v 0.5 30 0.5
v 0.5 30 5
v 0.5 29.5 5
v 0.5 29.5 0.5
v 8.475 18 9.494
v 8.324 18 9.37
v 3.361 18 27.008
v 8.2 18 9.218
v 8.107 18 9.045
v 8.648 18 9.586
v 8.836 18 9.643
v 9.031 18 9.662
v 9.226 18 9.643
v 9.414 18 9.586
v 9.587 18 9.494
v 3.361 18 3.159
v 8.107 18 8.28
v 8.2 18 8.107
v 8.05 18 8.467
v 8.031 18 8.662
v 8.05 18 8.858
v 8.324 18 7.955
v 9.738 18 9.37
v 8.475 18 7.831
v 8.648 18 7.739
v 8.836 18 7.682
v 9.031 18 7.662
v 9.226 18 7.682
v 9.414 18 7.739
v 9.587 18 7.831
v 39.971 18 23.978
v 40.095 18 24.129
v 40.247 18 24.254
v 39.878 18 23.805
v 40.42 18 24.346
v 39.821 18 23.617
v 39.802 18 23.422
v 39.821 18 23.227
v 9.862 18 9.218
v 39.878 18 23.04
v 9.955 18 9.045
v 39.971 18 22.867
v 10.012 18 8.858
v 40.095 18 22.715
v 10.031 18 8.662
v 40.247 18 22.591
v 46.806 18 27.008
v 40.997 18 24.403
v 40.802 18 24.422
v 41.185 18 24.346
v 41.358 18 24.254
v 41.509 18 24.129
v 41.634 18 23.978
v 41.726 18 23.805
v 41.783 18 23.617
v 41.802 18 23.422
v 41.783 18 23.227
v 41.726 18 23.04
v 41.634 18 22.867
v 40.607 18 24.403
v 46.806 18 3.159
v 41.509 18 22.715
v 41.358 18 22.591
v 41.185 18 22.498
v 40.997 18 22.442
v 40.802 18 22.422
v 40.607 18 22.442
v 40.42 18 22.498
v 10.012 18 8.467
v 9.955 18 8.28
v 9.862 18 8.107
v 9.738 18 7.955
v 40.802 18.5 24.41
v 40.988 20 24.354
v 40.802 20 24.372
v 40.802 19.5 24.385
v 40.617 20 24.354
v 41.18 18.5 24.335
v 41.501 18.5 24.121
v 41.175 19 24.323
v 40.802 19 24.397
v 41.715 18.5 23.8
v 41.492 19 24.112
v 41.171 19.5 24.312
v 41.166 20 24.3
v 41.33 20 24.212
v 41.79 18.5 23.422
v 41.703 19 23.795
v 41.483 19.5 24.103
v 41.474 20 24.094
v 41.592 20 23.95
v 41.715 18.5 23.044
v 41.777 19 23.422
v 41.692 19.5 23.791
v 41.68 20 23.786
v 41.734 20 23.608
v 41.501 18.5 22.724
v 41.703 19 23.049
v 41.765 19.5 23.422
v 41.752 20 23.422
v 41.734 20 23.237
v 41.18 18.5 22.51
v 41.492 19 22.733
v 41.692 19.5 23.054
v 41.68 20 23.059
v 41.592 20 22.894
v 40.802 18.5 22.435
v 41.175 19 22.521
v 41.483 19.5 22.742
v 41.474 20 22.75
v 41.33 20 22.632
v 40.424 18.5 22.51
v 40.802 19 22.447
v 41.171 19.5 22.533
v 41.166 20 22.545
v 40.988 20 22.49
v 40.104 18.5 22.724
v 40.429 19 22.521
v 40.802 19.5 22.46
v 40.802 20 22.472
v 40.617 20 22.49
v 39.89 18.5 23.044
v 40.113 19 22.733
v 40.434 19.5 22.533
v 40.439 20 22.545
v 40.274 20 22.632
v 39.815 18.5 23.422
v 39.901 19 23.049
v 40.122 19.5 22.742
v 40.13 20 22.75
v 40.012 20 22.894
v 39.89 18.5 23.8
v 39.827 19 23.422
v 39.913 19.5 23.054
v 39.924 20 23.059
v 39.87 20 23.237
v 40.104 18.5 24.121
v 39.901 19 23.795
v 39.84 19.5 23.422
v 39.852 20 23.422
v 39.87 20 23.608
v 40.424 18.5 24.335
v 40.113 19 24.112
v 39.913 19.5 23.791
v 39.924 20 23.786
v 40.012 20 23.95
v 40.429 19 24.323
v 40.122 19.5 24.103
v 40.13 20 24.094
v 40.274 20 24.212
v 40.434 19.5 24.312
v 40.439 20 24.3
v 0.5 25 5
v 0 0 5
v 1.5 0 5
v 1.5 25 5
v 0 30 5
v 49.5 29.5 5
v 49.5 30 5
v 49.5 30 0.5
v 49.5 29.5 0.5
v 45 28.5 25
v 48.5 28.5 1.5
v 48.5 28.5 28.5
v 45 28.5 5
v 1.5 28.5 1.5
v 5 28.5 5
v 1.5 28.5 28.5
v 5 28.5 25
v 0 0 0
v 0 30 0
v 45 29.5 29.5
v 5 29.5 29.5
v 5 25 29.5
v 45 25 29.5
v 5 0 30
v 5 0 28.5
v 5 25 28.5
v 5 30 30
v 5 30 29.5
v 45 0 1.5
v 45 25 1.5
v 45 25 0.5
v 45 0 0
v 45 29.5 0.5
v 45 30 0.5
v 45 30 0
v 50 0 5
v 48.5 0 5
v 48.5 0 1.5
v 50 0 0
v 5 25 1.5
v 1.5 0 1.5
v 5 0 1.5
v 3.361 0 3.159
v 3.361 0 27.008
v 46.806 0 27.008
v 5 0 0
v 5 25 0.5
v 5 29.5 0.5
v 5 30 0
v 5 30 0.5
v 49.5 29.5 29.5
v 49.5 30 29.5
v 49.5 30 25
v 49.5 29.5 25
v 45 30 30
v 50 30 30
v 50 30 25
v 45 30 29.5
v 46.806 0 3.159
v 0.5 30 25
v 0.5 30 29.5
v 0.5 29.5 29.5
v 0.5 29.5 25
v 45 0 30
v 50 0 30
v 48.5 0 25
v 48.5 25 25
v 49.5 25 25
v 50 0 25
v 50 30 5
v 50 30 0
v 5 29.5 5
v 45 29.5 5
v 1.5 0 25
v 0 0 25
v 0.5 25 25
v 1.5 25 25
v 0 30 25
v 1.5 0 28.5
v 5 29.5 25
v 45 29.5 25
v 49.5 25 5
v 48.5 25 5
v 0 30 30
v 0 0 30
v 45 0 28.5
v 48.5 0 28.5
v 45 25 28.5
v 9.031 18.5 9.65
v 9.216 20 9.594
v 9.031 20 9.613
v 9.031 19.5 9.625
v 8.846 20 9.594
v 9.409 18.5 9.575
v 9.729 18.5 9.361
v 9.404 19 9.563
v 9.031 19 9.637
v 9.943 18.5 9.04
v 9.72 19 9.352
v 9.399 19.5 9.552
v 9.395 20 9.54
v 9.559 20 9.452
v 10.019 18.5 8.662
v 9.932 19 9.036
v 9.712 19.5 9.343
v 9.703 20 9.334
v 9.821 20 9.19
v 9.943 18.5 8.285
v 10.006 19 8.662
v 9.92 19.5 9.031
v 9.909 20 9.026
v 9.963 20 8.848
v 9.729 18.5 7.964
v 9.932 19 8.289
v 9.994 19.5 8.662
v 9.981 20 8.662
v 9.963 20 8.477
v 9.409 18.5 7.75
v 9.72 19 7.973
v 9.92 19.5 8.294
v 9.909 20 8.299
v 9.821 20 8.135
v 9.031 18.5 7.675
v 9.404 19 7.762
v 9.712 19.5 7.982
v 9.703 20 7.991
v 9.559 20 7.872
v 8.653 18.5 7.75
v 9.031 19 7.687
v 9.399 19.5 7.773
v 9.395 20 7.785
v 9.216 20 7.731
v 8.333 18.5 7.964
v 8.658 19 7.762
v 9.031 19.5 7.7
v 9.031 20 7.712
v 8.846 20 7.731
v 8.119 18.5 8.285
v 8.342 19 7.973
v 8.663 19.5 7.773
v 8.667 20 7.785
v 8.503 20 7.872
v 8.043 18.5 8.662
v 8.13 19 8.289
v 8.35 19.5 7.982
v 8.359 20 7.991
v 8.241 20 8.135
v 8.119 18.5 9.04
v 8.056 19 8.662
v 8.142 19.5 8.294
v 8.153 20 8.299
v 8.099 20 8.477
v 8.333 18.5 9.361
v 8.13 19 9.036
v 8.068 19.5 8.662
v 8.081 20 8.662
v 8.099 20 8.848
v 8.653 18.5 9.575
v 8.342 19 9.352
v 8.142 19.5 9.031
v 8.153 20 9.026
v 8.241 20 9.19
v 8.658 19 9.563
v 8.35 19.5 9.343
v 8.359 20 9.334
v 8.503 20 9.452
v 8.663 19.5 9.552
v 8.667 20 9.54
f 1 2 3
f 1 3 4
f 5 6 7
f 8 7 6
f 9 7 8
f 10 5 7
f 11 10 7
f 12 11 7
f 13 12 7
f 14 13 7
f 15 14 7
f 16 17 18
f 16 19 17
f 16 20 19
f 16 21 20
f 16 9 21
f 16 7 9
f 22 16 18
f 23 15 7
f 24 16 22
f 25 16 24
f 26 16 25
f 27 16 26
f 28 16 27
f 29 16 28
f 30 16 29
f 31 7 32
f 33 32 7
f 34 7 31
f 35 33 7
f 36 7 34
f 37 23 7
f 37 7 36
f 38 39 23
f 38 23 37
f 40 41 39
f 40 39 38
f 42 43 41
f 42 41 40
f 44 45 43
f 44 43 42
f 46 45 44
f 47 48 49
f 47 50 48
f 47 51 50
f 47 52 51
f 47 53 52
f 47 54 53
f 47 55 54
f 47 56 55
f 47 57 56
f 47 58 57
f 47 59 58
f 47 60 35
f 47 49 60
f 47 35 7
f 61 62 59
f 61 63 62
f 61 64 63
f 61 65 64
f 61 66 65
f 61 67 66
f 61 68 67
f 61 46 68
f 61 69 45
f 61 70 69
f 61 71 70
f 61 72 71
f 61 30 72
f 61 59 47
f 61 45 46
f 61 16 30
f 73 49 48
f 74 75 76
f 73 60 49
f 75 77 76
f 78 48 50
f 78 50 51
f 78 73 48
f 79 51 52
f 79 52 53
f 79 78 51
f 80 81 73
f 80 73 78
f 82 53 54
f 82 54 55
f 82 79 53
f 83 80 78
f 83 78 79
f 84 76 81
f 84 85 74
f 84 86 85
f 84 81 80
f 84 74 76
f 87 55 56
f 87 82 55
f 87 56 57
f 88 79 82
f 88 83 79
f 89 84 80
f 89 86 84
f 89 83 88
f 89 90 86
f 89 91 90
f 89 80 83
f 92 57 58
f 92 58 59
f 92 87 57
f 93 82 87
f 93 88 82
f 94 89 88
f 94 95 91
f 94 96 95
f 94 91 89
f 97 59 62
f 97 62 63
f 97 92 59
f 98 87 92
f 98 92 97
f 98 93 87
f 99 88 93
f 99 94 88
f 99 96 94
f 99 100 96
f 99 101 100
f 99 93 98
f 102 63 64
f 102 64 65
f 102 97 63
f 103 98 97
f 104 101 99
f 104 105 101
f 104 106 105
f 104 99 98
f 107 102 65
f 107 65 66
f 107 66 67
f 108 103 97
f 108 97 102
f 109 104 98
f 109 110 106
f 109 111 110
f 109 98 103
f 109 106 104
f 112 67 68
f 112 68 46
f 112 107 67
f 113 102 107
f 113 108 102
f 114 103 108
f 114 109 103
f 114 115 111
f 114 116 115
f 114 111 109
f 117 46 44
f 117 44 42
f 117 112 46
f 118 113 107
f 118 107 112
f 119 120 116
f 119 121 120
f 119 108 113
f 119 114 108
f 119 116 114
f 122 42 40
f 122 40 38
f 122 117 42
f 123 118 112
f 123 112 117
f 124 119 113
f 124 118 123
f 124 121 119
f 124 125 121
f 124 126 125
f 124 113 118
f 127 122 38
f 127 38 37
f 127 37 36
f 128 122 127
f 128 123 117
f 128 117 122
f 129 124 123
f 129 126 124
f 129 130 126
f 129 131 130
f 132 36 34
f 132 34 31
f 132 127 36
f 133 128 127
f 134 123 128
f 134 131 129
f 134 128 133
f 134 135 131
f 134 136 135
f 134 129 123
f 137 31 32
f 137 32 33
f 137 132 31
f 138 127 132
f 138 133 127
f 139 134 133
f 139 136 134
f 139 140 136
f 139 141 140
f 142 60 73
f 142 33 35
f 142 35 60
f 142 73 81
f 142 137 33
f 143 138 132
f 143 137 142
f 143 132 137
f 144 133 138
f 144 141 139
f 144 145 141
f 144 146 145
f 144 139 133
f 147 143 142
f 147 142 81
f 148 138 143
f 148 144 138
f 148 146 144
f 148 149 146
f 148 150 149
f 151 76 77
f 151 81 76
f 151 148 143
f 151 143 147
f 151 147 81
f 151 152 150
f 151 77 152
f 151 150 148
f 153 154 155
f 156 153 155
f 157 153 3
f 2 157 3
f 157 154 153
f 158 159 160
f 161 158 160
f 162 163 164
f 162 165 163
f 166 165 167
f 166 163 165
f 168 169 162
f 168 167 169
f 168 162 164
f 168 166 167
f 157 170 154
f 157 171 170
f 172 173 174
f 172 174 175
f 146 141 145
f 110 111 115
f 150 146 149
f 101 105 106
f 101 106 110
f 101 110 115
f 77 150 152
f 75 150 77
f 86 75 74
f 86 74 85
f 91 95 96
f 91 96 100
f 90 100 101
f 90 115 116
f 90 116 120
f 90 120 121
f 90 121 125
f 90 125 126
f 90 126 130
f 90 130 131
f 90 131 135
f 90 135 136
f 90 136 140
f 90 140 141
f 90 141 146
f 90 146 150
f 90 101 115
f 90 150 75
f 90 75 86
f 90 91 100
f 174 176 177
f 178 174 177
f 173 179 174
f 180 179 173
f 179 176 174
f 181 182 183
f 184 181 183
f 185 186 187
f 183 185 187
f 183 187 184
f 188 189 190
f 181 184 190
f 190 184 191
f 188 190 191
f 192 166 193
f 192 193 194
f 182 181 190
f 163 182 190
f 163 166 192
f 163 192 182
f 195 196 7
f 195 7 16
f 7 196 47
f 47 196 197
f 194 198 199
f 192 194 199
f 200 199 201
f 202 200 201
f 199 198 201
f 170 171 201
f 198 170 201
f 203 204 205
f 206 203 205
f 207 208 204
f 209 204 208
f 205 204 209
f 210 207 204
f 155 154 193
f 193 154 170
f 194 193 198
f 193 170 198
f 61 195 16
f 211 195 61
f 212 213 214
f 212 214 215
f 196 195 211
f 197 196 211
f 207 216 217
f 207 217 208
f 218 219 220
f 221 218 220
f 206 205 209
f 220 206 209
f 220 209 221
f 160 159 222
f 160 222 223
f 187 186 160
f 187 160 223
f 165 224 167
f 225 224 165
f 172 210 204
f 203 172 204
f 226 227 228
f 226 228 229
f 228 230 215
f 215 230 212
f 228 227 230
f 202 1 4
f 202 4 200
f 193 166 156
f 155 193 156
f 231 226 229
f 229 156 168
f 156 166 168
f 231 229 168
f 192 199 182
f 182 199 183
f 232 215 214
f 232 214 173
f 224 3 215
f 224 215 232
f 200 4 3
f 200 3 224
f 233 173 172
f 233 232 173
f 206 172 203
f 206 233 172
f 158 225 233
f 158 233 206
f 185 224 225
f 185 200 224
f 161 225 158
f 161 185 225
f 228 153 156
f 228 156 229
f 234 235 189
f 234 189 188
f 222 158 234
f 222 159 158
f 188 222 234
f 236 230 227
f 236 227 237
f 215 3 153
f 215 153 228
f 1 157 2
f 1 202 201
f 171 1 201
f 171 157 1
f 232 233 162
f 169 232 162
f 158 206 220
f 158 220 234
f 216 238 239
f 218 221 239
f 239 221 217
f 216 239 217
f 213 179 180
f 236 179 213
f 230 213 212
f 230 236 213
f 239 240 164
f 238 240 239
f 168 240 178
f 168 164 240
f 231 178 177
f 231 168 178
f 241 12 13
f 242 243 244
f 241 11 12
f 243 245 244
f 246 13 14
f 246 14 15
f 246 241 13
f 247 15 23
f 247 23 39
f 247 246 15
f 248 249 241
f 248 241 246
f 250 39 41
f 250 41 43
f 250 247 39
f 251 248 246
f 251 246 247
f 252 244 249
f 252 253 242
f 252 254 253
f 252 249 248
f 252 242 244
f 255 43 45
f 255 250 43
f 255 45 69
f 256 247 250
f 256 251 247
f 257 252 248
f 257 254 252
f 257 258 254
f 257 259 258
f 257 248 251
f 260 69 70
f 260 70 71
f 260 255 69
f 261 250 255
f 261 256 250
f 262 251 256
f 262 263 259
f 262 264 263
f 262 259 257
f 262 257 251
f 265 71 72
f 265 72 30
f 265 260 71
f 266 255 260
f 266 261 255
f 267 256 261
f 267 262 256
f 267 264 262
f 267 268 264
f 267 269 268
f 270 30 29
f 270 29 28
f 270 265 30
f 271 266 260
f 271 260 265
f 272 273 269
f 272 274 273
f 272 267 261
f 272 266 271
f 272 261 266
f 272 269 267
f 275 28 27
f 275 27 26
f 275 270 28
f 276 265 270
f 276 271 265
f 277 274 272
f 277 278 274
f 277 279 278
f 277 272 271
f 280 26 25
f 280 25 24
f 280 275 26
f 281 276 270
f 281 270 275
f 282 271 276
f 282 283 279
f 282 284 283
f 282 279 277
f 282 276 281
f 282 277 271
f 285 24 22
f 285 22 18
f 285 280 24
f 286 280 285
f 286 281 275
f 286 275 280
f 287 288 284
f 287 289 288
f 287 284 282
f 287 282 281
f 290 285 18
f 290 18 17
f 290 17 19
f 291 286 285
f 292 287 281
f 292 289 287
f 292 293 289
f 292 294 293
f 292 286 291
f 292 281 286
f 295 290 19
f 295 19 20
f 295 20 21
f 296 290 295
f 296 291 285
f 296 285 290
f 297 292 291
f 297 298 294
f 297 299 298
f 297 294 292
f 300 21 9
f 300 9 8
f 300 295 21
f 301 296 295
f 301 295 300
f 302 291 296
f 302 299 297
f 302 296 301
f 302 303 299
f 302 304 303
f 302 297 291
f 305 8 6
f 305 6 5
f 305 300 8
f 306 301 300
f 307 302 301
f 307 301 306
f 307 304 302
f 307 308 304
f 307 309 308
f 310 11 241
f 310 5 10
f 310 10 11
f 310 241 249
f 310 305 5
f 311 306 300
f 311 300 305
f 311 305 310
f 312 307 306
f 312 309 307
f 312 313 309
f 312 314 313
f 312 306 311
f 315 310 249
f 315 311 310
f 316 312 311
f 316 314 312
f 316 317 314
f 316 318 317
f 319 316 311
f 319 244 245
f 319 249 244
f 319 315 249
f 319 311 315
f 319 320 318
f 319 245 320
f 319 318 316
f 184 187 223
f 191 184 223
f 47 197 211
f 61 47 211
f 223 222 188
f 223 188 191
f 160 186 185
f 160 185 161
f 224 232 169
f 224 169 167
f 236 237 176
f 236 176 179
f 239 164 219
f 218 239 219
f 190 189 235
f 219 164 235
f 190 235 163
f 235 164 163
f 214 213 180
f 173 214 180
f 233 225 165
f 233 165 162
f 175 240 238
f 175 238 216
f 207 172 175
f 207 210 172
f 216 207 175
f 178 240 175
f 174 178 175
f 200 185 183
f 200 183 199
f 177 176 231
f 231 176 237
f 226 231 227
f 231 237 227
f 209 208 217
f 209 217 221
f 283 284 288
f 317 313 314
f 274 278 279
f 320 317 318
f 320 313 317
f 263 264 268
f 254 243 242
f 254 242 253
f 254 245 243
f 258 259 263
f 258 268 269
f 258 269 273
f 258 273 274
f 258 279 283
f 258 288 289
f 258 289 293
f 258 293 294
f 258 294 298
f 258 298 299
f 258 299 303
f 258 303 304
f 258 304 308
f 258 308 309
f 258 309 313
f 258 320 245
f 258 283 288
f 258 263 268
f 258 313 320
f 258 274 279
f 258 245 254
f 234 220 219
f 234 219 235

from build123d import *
from OCP.BRepFilletAPI import BRepFilletAPI_MakeChamfer

# Parameters (mm, degrees)
SALIENTE_EXTRUIR1_DEPTH  = 1.5
SALIENTE_EXTRUIR2_DEPTH  = 3.5
CROQUIS3_W               = 25
CROQUIS3_H               = 5
SALIENTE_EXTRUIR3_DEPTH  = 1.5
CROQUIS4_W               = 25
CROQUIS4_H               = 1.5
SALIENTE_EXTRUIR4_DEPTH  = 3.5
CROQUIS5_W               = 5
CROQUIS5_H               = 25
SALIENTE_EXTRUIR5_DEPTH  = 1.5
CROQUIS6_W               = 1.5
CROQUIS6_H               = 28.5
SALIENTE_EXTRUIR6_DEPTH  = 3.5
SALIENTE_EXTRUIR7_DEPTH  = 1.5
SALIENTE_EXTRUIR9_DEPTH  = 3.5
SALIENTE_EXTRUIR10_REACH = 63.847
CROQUIS10_W              = 40
CROQUIS10_H              = 5
CORTAR_EXTRUIR1_DEPTH    = 0.5
CROQUIS11_W              = 5
CROQUIS11_H              = 20
CROQUIS11_W_2            = 40
CROQUIS11_H_2            = 4.5
CROQUIS11_H_3            = 5
CORTAR_EXTRUIR2_DEPTH    = 0.5
CROQUIS12_W              = 40
CROQUIS12_H              = 4.5
CORTAR_EXTRUIR3_DEPTH    = 0.5
CROQUIS13_W              = 20
CROQUIS13_H              = 4.5
CORTAR_EXTRUIR4_DEPTH    = 0.5
CROQUIS14_W              = 20
CROQUIS14_H              = 4.5
CORTAR_EXTRUIR5_DEPTH    = 0.5
CROQUIS16_W              = 4.5
CROQUIS16_H              = 4.5
CORTAR_EXTRUIR8_DEPTH    = 0.5
CROQUIS17_W              = 43.445704927
CROQUIS17_H              = 23.849273722
SALIENTE_EXTRUIR11_DEPTH = 18
CROQUIS19_R              = 1
SALIENTE_EXTRUIR12_DEPTH = 2
CHAFL_N1_SIZE            = 2
CHAFL_N1_SIZE_2          = 0.05


with BuildPart() as part:
    # Croquis1 → Saliente-Extruir1 (new body)
    with BuildSketch(Plane.XY):
        Polygon((0, 30), (0, 0), (5, 0), (5, 25), (45, 25), (45, 0), (50, 0), (50, 30), (5, 30), align=None)
    extrude(amount=SALIENTE_EXTRUIR1_DEPTH)

    # Croquis2 → Saliente-Extruir2 (add)
    with BuildSketch(Plane.XY.offset(1.5)):
        Polygon((0, 0), (1.5, 0), (1.5, 28.5), (48.5, 28.5), (48.5, 0), (50, 0), (50, 28.5), (50, 30), (48.5, 30), (0, 30), align=None)
    extrude(amount=SALIENTE_EXTRUIR2_DEPTH)

    # Croquis3 → Saliente-Extruir3 (add)
    with BuildSketch(Plane.ZY):
        with Locations((17.5, 27.5)):
            Rectangle(CROQUIS3_W, CROQUIS3_H)
    extrude(amount=-SALIENTE_EXTRUIR3_DEPTH)

    # Croquis4 → Saliente-Extruir4 (add)
    with BuildSketch(Plane(origin=(1.5, 0, 0), x_dir=(0, 0, -1), z_dir=(1, 0, 0))):
        with Locations((-17.5, 29.25)):
            Rectangle(CROQUIS4_W, CROQUIS4_H)
    extrude(amount=SALIENTE_EXTRUIR4_DEPTH)

    # Croquis5 → Saliente-Extruir5 (add)
    with BuildSketch(Plane.ZY):
        with Locations((27.5, 12.5)):
            Rectangle(CROQUIS5_W, CROQUIS5_H)
    extrude(amount=-SALIENTE_EXTRUIR5_DEPTH)

    # Croquis6 → Saliente-Extruir6 (add)
    with BuildSketch(Plane(origin=(1.5, 0, 0), x_dir=(0, 0, -1), z_dir=(1, 0, 0))):
        with Locations((-29.25, 14.25)):
            Rectangle(CROQUIS6_W, CROQUIS6_H)
    extrude(amount=SALIENTE_EXTRUIR6_DEPTH)

    # Croquis7 → Saliente-Extruir7 (add)
    with BuildSketch(Plane(origin=(50, 0, 0), x_dir=(0, 0, -1), z_dir=(1, 0, 0))):
        Polygon((-5, 30), (-30, 30), (-30, 0), (-25, 0), (-25, 25), (-5, 25), align=None)
    extrude(amount=-SALIENTE_EXTRUIR7_DEPTH)

    # Croquis8 → Saliente-Extruir9 (add)
    with BuildSketch(Plane.ZY.offset(-48.5)):
        Polygon((5, 28.5), (25, 28.5), (28.5, 28.5), (28.5, 0), (30, 0), (30, 30), (5, 30), align=None)
    extrude(amount=SALIENTE_EXTRUIR9_DEPTH)

    # Croquis9 → Saliente-Extruir10 (add, up to next)
    with BuildSketch(Plane(origin=(5, 0, 0), x_dir=(0, 0, -1), z_dir=(1, 0, 0)), mode=Mode.PRIVATE) as saliente_extruir10_sk1:
        Polygon((-28.5, 25), (-30, 25), (-30, 30), (-25, 30), (-25, 28.5), (-28.5, 28.5), align=None)
    saliente_extruir10_tool1 = extrude(saliente_extruir10_sk1.sketch, amount=SALIENTE_EXTRUIR10_REACH, mode=Mode.PRIVATE) - part.part
    add(saliente_extruir10_tool1.solids().sort_by_distance((5, 25.070711, 29.25))[0])

    # Croquis10 → Cortar-Extruir1 (cut)
    with BuildSketch(Plane(origin=(0, 0, 0), x_dir=(-1, 0, 0), z_dir=(0, 0, -1))):
        with Locations((-25, 27.5)):
            Rectangle(CROQUIS10_W, CROQUIS10_H)
    extrude(amount=-CORTAR_EXTRUIR1_DEPTH, mode=Mode.SUBTRACT)

    # Croquis11 → Cortar-Extruir2 (cut)
    with BuildSketch(Plane(origin=(0, 30, 0), x_dir=(1, 0, 0), z_dir=(0, 1, 0))):
        with Locations((2.5, -15)):
            Rectangle(CROQUIS11_W, CROQUIS11_H)
        with Locations((25, -2.75)):
            Rectangle(CROQUIS11_W_2, CROQUIS11_H_2)
        with Locations((25, -27.5)):
            Rectangle(CROQUIS11_W_2, CROQUIS11_H_3)
        with Locations((47.5, -15)):
            Rectangle(CROQUIS11_W, CROQUIS11_H)
    extrude(amount=-CORTAR_EXTRUIR2_DEPTH, mode=Mode.SUBTRACT)

    # Croquis12 → Cortar-Extruir3 (cut)
    with BuildSketch(Plane.XY.offset(30)):
        with Locations((25, 27.25)):
            Rectangle(CROQUIS12_W, CROQUIS12_H)
    extrude(amount=-CORTAR_EXTRUIR3_DEPTH, mode=Mode.SUBTRACT)

    # Croquis13 → Cortar-Extruir4 (cut)
    with BuildSketch(Plane(origin=(50, 0, 0), x_dir=(0, 0, -1), z_dir=(1, 0, 0))):
        with Locations((-15, 27.25)):
            Rectangle(CROQUIS13_W, CROQUIS13_H)
    extrude(amount=-CORTAR_EXTRUIR4_DEPTH, mode=Mode.SUBTRACT)

    # Croquis14 → Cortar-Extruir5 (cut)
    with BuildSketch(Plane.ZY):
        with Locations((15, 27.25)):
            Rectangle(CROQUIS14_W, CROQUIS14_H)
    extrude(amount=-CORTAR_EXTRUIR5_DEPTH, mode=Mode.SUBTRACT)

    # Croquis16 → Cortar-Extruir8 (cut)
    with BuildSketch(Plane(origin=(0, 30, 0), x_dir=(1, 0, 0), z_dir=(0, 1, 0))):
        with Locations((2.75, -2.75)):
            Rectangle(CROQUIS16_W, CROQUIS16_H)
        with Locations((47.25, -2.75)):
            Rectangle(CROQUIS16_W, CROQUIS16_H)
        with Locations((47.25, -27.25)):
            Rectangle(CROQUIS16_W, CROQUIS16_H)
        with Locations((2.75, -27.25)):
            Rectangle(CROQUIS16_W, CROQUIS16_H)
    extrude(amount=-CORTAR_EXTRUIR8_DEPTH, mode=Mode.SUBTRACT)


with BuildPart() as body_2:
    # Croquis17 → Saliente-Extruir11 (new body)
    with BuildSketch(Plane(origin=(0, 0, 0), x_dir=(1, 0, 0), z_dir=(0, 1, 0))):
        with Locations((25.083389069, -15.083389069)):
            Rectangle(CROQUIS17_W, CROQUIS17_H)
    extrude(amount=SALIENTE_EXTRUIR11_DEPTH)

    # Croquis19 → Saliente-Extruir12 (add)
    with BuildSketch(Plane(origin=(0, 18, 0), x_dir=(1, 0, 0), z_dir=(0, 1, 0))):
        with Locations(Location((9.030993295, -8.662430759, 0), (0, 0, 270))):
            Circle(CROQUIS19_R)
        with Locations(Location((40.802228568, -23.422295965, 0), (0, 0, 270))):
            Circle(CROQUIS19_R)
    extrude(amount=SALIENTE_EXTRUIR12_DEPTH)

    # Chaflán1
    chafl_n1_edges_1 = [body_2.edges().sort_by_distance(p)[0] for p in [
        (9.030993295, 20, 7.662430759),
    ]]
    chafl_n1_side_1 = [body_2.faces().sort_by_distance(p)[0] for p in [
        (9.030993295, 19.999, 7.662430759),
    ]]
    chafl_n1_edges_2 = [body_2.edges().sort_by_distance(p)[0] for p in [
        (40.802228568, 20, 22.422295965),
    ]]
    chafl_n1_side_2 = [body_2.faces().sort_by_distance(p)[0] for p in [
        (40.802228568, 19.999, 22.422295965),
    ]]
    chafl_n1 = BRepFilletAPI_MakeChamfer(body_2.part.solid().wrapped)
    for e in chafl_n1_edges_1:
        chafl_n1.Add(CHAFL_N1_SIZE - 0.0001, CHAFL_N1_SIZE_2 - 0.0001, e.wrapped, chafl_n1_side_1[0].wrapped)
    for e in chafl_n1_edges_2:
        chafl_n1.Add(CHAFL_N1_SIZE - 0.0001, CHAFL_N1_SIZE_2 - 0.0001, e.wrapped, chafl_n1_side_2[0].wrapped)
    add(Compound.cast(chafl_n1.Shape()), mode=Mode.REPLACE)  # a hair under: the kernel refuses the full size


solid = Compound([part.part, body_2.part])
